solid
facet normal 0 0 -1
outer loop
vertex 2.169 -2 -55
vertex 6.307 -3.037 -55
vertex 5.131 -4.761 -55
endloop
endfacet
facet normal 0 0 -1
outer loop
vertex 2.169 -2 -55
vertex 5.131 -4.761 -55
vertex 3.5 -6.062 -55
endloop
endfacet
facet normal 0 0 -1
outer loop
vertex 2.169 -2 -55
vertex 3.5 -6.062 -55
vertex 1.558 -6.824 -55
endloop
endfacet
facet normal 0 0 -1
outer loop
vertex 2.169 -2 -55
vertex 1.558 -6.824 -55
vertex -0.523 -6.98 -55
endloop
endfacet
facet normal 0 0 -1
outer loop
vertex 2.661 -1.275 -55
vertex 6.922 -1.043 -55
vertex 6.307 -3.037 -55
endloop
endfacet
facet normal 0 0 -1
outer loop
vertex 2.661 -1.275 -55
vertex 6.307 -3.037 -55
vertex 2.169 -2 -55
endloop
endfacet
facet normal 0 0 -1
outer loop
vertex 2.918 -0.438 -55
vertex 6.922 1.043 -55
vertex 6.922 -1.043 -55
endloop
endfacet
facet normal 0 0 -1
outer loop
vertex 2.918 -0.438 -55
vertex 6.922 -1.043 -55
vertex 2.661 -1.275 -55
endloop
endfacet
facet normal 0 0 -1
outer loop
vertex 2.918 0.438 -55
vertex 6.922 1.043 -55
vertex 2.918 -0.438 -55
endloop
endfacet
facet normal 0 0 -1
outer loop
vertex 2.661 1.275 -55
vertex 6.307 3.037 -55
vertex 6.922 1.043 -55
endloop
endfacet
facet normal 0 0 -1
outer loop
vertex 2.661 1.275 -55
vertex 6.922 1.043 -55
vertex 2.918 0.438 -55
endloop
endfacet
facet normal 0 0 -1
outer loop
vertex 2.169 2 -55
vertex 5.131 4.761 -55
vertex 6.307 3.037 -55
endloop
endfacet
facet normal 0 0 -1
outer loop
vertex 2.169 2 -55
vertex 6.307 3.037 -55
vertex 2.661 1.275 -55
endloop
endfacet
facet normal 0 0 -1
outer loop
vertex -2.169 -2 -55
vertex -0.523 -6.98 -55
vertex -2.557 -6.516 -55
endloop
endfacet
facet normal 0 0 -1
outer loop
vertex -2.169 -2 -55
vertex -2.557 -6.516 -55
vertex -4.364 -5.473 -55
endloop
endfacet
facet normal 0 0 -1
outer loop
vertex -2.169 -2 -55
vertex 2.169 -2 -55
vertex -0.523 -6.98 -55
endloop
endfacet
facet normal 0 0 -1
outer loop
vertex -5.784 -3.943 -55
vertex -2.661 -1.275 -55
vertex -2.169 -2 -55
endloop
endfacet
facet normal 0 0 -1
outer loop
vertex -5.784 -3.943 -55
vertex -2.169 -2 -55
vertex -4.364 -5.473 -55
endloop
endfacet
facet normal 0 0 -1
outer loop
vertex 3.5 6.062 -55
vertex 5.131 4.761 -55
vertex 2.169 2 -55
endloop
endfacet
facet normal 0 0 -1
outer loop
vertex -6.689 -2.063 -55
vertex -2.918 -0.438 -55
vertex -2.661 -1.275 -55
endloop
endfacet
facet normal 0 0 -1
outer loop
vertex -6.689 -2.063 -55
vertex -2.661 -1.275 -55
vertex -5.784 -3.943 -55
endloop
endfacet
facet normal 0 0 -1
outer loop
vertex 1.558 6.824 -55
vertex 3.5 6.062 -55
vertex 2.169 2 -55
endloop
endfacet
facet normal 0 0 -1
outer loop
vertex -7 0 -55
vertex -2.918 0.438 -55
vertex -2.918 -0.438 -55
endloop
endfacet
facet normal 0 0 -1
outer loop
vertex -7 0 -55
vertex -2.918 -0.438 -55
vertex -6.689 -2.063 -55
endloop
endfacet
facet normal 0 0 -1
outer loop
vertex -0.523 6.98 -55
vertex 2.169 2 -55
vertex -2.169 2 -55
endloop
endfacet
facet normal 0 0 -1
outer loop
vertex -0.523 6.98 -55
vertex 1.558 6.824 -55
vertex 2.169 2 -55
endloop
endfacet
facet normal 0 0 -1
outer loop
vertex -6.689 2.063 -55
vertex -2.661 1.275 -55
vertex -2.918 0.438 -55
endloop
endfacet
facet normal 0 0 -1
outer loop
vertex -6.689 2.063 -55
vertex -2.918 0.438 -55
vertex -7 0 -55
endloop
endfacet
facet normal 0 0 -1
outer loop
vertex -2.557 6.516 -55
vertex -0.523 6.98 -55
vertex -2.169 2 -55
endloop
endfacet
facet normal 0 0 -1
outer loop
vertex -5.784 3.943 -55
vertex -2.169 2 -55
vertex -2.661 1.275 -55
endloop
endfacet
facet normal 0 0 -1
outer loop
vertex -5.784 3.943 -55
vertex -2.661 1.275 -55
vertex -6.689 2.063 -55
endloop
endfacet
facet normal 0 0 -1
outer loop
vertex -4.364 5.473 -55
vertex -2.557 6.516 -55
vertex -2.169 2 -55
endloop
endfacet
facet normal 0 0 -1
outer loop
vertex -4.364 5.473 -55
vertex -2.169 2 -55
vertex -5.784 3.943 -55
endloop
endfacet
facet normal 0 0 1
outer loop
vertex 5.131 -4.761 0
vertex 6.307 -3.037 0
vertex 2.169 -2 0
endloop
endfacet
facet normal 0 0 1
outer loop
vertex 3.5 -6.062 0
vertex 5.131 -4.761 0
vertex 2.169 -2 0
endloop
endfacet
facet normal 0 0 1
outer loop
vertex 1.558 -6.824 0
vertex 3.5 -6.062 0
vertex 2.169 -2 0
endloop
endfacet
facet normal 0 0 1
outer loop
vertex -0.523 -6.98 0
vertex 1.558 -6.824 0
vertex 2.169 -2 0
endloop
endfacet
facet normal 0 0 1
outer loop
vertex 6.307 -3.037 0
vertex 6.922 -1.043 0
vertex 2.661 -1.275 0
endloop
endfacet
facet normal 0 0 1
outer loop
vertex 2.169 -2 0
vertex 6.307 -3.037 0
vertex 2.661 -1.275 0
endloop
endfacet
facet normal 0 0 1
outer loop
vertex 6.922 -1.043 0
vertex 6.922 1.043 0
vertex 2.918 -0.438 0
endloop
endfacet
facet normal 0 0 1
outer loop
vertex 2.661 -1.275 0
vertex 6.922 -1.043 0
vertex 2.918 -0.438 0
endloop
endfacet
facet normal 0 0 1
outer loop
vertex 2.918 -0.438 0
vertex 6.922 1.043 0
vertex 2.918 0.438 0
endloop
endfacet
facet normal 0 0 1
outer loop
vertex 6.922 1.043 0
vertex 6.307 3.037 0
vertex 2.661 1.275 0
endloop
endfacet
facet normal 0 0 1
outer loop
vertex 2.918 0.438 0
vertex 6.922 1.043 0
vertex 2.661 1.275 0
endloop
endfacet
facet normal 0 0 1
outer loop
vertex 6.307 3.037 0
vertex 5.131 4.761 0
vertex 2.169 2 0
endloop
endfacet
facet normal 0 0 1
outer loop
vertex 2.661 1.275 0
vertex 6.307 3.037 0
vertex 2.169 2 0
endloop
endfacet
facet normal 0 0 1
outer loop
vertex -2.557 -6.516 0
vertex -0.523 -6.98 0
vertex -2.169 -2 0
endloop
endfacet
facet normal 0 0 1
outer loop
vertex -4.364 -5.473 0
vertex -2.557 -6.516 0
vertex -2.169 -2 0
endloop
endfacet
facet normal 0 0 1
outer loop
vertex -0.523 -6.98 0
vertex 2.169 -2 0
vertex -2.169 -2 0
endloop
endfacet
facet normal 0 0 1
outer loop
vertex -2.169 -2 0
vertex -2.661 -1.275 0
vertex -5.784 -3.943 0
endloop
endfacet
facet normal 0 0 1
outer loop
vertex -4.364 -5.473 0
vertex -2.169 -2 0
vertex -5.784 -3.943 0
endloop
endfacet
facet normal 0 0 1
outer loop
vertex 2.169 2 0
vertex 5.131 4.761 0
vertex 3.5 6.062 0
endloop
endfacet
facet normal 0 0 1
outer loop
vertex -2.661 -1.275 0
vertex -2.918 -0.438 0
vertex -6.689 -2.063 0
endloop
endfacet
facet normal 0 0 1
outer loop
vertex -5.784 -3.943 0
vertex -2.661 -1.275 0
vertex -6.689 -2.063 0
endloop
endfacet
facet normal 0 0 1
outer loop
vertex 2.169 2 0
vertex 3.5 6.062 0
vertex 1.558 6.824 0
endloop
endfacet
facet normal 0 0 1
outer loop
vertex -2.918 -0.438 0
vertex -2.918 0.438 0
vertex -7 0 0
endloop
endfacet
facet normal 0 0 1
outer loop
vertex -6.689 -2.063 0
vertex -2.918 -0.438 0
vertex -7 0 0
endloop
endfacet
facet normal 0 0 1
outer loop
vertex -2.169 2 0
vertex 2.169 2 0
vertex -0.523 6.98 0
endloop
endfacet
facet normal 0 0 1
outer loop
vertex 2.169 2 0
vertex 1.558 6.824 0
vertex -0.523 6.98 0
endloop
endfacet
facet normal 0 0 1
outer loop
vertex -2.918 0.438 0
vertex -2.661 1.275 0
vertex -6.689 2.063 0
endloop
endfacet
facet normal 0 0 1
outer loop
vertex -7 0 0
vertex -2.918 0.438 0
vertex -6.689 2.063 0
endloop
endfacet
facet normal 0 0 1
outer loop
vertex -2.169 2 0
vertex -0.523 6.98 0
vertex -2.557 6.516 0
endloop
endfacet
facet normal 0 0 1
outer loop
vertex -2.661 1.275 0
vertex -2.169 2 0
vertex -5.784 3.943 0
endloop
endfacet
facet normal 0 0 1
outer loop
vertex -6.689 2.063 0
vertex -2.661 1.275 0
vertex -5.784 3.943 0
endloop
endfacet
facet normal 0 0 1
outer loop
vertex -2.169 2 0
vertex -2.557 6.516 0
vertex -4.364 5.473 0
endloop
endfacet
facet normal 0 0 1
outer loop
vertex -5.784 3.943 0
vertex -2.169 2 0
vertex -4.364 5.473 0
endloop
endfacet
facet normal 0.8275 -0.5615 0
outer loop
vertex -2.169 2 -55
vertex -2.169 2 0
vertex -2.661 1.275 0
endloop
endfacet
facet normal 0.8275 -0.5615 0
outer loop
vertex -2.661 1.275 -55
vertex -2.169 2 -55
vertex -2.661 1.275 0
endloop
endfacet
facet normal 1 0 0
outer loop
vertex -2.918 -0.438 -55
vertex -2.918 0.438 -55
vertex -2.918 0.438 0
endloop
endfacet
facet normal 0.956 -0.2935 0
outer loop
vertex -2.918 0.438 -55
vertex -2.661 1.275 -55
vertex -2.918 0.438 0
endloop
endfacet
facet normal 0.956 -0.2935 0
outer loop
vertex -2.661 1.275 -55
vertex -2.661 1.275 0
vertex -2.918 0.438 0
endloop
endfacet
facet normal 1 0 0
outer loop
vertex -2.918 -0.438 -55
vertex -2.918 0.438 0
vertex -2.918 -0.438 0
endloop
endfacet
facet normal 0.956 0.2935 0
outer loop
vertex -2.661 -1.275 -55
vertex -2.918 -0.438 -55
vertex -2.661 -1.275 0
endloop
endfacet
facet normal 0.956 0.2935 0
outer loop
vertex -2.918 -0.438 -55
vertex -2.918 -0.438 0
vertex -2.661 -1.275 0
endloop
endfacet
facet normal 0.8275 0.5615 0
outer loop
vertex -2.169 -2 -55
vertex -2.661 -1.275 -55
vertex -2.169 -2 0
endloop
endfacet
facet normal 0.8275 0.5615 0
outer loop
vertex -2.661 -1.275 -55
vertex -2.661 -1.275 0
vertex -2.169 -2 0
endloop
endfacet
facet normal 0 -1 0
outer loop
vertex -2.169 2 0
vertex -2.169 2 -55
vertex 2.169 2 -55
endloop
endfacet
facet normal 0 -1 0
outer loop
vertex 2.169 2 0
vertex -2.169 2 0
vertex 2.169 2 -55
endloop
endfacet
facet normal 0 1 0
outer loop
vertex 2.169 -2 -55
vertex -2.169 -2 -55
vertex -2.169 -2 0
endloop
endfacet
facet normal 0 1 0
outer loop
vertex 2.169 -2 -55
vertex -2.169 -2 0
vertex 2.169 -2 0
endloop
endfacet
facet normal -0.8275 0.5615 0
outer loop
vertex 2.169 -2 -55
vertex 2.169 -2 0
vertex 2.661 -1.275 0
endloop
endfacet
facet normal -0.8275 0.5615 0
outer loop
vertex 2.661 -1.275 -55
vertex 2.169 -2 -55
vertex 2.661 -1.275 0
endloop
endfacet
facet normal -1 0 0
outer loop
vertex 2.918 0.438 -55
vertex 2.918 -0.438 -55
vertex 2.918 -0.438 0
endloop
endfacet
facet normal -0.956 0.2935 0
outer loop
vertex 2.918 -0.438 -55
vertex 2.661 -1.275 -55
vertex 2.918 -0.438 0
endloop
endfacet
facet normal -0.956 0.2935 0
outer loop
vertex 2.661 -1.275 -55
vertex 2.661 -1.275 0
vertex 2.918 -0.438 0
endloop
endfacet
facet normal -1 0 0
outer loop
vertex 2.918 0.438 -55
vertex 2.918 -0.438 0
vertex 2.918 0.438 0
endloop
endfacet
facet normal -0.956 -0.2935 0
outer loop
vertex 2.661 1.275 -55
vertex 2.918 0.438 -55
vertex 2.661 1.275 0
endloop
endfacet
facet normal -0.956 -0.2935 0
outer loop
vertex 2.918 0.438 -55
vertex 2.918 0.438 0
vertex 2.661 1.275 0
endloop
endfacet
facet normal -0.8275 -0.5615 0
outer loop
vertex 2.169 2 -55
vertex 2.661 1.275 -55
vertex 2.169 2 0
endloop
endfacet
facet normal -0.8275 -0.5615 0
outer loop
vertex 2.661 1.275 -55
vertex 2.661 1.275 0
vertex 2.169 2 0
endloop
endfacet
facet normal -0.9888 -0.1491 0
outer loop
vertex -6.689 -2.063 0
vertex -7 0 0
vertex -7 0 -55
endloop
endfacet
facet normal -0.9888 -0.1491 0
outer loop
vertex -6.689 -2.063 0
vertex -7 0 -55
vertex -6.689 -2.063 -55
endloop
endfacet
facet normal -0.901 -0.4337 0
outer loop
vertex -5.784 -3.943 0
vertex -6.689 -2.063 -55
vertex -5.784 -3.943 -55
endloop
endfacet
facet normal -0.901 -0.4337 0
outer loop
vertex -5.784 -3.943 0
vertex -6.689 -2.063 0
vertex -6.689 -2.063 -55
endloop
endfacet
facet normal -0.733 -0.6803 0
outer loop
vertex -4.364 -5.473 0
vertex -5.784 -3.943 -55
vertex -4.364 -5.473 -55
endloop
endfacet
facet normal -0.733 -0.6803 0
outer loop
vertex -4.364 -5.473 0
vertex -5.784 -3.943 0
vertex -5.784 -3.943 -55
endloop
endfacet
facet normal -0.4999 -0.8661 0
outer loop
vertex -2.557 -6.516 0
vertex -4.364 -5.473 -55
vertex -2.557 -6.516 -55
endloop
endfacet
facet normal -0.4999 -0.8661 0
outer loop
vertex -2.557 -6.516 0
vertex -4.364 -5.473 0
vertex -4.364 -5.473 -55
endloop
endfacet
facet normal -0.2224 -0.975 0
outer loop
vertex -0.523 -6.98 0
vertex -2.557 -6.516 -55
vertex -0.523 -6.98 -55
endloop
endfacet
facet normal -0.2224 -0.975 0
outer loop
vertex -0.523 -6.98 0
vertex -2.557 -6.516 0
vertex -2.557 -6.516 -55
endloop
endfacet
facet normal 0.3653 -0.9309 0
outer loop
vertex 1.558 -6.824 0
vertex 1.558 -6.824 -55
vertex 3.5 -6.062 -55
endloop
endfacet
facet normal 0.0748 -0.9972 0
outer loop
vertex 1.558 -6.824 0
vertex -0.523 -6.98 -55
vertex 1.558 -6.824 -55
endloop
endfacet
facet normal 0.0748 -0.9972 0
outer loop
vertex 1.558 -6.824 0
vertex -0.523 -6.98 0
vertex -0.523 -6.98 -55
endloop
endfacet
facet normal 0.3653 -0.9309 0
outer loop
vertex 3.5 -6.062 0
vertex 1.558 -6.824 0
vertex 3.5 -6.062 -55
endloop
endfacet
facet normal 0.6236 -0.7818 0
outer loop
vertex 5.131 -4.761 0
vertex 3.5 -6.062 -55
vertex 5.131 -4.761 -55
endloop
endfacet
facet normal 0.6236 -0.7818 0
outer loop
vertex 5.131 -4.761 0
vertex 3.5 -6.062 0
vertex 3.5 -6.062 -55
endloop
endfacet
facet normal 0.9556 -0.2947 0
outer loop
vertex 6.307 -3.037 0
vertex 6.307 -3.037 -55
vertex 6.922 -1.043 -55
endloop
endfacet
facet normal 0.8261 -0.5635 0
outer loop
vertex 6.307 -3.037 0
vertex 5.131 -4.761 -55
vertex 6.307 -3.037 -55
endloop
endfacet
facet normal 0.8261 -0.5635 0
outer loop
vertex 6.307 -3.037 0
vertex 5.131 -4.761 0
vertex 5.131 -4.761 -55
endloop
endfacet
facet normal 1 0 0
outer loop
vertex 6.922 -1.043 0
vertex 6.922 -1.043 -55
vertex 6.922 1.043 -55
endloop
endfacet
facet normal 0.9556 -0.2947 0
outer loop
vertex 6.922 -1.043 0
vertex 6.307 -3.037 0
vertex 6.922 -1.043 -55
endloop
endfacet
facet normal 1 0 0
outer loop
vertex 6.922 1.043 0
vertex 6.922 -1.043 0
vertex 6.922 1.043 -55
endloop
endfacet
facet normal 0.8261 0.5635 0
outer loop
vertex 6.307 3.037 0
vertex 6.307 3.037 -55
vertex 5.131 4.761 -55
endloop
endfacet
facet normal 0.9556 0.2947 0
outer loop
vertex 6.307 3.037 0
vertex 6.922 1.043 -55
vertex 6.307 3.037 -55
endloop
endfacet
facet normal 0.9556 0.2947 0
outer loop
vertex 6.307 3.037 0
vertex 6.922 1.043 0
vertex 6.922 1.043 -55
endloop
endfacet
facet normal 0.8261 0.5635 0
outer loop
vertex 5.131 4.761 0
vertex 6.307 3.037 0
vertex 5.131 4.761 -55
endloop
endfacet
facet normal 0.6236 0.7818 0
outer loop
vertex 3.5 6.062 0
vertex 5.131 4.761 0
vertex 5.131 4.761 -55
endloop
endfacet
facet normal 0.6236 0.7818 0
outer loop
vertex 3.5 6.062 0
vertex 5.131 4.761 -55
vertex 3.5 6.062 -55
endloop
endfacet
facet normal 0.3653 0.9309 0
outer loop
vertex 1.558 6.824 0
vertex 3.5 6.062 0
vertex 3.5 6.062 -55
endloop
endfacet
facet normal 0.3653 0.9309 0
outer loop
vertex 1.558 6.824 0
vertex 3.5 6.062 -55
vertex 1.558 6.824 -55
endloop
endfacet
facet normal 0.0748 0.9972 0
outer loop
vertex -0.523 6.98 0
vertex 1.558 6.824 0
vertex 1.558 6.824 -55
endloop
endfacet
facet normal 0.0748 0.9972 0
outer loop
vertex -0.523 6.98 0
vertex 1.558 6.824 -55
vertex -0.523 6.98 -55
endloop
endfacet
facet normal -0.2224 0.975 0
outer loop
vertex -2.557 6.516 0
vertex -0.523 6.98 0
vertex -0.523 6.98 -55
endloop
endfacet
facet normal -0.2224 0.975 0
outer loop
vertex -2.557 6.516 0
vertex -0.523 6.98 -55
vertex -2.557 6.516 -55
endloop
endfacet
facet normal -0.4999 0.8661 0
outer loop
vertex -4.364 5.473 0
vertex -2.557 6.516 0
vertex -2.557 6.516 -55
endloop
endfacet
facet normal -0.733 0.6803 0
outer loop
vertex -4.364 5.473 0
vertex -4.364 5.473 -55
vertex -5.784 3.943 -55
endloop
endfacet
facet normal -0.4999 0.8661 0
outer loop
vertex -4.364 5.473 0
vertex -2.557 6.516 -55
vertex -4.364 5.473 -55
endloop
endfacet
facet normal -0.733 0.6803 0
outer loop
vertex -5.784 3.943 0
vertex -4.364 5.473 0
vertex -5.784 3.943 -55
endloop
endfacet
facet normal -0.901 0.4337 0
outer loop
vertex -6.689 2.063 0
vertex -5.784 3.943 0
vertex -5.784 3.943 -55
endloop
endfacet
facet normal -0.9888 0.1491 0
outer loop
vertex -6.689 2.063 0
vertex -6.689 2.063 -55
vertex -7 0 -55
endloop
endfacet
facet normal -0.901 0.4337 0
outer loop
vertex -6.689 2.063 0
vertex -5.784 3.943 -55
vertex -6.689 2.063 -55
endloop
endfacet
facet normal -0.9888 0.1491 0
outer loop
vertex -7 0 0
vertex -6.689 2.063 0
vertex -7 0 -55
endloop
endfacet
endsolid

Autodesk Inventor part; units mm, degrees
ref_plane "YZ Plane" through (0, 0, 0) normal (1, 0, 0) x (0, 1, 0)
ref_plane "XZ Plane" through (0, 0, 0) normal (0, 1, 0) x (-1, 0, 0)
ref_plane "XY Plane" through (0, 0, 0) normal (0, 0, 1) x (1, 0, 0)
sketch "Boceto1" plane through (2.1662, 2, 0) normal (0, 0, -1) x (-1, 0, 0)
  line L0 (4.3355, -4) -> (-0.0031, -4)
  line L1 (4.3355, 0) -> (-0.0031, 0)
  arc A0 (4.3355, -4) -> (4.3355, 0) centre (2.1662, -2) ccw
  arc A1 (-0.0031, 0) -> (-0.0031, -4) centre (2.1662, -2) ccw
  circle A2 centre (2.1662, -2) radius 6.9999
extrude "Extrusión1" add sketch "Boceto1" along normal blind 55
properties part number "Rodamiento_Motor_X2"
